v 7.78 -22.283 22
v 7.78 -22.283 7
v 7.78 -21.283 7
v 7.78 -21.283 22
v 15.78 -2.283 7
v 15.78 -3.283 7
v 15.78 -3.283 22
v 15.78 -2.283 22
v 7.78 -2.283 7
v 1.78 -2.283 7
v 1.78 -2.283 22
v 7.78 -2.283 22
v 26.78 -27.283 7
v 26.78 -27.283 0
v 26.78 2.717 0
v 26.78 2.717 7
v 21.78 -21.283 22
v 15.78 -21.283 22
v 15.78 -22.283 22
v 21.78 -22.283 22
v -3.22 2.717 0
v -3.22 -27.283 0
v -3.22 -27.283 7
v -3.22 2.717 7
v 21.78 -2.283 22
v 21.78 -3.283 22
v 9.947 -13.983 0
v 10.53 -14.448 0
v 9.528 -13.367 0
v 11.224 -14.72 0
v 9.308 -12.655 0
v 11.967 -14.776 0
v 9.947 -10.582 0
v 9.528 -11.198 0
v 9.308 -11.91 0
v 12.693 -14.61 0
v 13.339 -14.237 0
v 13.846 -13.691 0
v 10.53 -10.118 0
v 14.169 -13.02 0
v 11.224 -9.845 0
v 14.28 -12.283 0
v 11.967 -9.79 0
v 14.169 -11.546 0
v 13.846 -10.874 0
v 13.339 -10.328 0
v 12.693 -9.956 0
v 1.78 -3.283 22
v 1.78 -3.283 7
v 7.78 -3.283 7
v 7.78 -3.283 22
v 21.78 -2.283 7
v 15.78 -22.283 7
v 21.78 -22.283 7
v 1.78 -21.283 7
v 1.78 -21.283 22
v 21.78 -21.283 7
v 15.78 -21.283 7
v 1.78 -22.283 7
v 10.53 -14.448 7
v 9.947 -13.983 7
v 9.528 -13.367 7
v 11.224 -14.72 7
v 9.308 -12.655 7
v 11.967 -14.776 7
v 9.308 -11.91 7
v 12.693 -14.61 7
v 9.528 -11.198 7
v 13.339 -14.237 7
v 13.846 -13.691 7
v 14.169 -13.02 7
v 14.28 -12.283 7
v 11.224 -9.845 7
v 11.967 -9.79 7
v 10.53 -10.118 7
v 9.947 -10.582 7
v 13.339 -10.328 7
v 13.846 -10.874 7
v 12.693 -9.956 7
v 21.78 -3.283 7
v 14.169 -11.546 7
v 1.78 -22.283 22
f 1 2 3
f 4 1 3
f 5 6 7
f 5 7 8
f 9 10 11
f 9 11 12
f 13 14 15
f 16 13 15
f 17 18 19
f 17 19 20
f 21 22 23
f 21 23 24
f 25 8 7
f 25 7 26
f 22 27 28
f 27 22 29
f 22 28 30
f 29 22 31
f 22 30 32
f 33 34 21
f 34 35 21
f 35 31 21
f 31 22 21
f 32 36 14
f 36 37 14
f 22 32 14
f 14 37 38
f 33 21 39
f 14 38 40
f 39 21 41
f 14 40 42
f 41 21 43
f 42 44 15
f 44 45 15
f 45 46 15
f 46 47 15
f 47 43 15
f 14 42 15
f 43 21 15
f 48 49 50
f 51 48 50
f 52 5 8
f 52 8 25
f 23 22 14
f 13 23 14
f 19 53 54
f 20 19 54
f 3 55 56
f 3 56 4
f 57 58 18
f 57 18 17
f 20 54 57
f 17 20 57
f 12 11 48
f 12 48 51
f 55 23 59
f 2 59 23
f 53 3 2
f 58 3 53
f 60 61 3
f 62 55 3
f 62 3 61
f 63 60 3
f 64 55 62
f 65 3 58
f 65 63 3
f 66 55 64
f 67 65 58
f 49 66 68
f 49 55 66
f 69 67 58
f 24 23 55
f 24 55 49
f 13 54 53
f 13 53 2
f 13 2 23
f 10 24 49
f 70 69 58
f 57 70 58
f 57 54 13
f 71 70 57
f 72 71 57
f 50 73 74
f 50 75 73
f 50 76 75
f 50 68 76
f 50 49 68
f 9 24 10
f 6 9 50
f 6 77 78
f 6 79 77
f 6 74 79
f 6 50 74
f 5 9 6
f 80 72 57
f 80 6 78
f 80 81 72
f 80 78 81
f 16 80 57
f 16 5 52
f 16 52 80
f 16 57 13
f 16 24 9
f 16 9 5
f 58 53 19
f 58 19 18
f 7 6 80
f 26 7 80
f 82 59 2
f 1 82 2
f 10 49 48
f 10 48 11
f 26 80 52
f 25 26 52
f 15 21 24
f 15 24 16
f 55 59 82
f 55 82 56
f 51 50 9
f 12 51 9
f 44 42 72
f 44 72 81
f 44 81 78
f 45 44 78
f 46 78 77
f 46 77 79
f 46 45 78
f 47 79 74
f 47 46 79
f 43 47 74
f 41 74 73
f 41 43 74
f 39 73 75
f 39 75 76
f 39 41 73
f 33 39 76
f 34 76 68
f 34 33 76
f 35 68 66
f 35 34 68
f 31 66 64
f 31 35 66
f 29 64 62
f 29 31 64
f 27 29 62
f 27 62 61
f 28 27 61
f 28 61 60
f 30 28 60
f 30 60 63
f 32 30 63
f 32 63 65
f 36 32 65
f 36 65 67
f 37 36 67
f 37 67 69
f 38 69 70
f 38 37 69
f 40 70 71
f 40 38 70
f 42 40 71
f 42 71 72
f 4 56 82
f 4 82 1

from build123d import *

# Parameters (mm, degrees)
ESQUISSE1_W        = 30
ESQUISSE1_H        = 30
ESQUISSE1_R        = 2.5
BOSS_EXTRU_1_DEPTH = 7
ESQUISSE2_W        = 6
ESQUISSE2_H        = 1
BOSS_EXTRU_2_DEPTH = 15


with BuildPart() as part:
    # Esquisse1 → Boss.-Extru.1 (new body)
    with BuildSketch(Plane.XY):
        with Locations((11.780048077, -12.282786885)):
            Rectangle(ESQUISSE1_W, ESQUISSE1_H)
        with Locations((11.780048077, -12.282786885)):
            Circle(ESQUISSE1_R, mode=Mode.SUBTRACT)
    extrude(amount=BOSS_EXTRU_1_DEPTH)

    # Esquisse2 → Boss.-Extru.2 (add)
    with BuildSketch(Plane.XY.offset(7)):
        with Locations((4.780048077, -2.782786885)):
            Rectangle(ESQUISSE2_W, ESQUISSE2_H)
        with Locations((18.780048077, -2.782786885)):
            Rectangle(ESQUISSE2_W, ESQUISSE2_H)
        with Locations((4.780048077, -21.782786885)):
            Rectangle(ESQUISSE2_W, ESQUISSE2_H)
        with Locations((18.780048077, -21.782786885)):
            Rectangle(ESQUISSE2_W, ESQUISSE2_H)
    extrude(amount=BOSS_EXTRU_2_DEPTH)


solid = part.part
